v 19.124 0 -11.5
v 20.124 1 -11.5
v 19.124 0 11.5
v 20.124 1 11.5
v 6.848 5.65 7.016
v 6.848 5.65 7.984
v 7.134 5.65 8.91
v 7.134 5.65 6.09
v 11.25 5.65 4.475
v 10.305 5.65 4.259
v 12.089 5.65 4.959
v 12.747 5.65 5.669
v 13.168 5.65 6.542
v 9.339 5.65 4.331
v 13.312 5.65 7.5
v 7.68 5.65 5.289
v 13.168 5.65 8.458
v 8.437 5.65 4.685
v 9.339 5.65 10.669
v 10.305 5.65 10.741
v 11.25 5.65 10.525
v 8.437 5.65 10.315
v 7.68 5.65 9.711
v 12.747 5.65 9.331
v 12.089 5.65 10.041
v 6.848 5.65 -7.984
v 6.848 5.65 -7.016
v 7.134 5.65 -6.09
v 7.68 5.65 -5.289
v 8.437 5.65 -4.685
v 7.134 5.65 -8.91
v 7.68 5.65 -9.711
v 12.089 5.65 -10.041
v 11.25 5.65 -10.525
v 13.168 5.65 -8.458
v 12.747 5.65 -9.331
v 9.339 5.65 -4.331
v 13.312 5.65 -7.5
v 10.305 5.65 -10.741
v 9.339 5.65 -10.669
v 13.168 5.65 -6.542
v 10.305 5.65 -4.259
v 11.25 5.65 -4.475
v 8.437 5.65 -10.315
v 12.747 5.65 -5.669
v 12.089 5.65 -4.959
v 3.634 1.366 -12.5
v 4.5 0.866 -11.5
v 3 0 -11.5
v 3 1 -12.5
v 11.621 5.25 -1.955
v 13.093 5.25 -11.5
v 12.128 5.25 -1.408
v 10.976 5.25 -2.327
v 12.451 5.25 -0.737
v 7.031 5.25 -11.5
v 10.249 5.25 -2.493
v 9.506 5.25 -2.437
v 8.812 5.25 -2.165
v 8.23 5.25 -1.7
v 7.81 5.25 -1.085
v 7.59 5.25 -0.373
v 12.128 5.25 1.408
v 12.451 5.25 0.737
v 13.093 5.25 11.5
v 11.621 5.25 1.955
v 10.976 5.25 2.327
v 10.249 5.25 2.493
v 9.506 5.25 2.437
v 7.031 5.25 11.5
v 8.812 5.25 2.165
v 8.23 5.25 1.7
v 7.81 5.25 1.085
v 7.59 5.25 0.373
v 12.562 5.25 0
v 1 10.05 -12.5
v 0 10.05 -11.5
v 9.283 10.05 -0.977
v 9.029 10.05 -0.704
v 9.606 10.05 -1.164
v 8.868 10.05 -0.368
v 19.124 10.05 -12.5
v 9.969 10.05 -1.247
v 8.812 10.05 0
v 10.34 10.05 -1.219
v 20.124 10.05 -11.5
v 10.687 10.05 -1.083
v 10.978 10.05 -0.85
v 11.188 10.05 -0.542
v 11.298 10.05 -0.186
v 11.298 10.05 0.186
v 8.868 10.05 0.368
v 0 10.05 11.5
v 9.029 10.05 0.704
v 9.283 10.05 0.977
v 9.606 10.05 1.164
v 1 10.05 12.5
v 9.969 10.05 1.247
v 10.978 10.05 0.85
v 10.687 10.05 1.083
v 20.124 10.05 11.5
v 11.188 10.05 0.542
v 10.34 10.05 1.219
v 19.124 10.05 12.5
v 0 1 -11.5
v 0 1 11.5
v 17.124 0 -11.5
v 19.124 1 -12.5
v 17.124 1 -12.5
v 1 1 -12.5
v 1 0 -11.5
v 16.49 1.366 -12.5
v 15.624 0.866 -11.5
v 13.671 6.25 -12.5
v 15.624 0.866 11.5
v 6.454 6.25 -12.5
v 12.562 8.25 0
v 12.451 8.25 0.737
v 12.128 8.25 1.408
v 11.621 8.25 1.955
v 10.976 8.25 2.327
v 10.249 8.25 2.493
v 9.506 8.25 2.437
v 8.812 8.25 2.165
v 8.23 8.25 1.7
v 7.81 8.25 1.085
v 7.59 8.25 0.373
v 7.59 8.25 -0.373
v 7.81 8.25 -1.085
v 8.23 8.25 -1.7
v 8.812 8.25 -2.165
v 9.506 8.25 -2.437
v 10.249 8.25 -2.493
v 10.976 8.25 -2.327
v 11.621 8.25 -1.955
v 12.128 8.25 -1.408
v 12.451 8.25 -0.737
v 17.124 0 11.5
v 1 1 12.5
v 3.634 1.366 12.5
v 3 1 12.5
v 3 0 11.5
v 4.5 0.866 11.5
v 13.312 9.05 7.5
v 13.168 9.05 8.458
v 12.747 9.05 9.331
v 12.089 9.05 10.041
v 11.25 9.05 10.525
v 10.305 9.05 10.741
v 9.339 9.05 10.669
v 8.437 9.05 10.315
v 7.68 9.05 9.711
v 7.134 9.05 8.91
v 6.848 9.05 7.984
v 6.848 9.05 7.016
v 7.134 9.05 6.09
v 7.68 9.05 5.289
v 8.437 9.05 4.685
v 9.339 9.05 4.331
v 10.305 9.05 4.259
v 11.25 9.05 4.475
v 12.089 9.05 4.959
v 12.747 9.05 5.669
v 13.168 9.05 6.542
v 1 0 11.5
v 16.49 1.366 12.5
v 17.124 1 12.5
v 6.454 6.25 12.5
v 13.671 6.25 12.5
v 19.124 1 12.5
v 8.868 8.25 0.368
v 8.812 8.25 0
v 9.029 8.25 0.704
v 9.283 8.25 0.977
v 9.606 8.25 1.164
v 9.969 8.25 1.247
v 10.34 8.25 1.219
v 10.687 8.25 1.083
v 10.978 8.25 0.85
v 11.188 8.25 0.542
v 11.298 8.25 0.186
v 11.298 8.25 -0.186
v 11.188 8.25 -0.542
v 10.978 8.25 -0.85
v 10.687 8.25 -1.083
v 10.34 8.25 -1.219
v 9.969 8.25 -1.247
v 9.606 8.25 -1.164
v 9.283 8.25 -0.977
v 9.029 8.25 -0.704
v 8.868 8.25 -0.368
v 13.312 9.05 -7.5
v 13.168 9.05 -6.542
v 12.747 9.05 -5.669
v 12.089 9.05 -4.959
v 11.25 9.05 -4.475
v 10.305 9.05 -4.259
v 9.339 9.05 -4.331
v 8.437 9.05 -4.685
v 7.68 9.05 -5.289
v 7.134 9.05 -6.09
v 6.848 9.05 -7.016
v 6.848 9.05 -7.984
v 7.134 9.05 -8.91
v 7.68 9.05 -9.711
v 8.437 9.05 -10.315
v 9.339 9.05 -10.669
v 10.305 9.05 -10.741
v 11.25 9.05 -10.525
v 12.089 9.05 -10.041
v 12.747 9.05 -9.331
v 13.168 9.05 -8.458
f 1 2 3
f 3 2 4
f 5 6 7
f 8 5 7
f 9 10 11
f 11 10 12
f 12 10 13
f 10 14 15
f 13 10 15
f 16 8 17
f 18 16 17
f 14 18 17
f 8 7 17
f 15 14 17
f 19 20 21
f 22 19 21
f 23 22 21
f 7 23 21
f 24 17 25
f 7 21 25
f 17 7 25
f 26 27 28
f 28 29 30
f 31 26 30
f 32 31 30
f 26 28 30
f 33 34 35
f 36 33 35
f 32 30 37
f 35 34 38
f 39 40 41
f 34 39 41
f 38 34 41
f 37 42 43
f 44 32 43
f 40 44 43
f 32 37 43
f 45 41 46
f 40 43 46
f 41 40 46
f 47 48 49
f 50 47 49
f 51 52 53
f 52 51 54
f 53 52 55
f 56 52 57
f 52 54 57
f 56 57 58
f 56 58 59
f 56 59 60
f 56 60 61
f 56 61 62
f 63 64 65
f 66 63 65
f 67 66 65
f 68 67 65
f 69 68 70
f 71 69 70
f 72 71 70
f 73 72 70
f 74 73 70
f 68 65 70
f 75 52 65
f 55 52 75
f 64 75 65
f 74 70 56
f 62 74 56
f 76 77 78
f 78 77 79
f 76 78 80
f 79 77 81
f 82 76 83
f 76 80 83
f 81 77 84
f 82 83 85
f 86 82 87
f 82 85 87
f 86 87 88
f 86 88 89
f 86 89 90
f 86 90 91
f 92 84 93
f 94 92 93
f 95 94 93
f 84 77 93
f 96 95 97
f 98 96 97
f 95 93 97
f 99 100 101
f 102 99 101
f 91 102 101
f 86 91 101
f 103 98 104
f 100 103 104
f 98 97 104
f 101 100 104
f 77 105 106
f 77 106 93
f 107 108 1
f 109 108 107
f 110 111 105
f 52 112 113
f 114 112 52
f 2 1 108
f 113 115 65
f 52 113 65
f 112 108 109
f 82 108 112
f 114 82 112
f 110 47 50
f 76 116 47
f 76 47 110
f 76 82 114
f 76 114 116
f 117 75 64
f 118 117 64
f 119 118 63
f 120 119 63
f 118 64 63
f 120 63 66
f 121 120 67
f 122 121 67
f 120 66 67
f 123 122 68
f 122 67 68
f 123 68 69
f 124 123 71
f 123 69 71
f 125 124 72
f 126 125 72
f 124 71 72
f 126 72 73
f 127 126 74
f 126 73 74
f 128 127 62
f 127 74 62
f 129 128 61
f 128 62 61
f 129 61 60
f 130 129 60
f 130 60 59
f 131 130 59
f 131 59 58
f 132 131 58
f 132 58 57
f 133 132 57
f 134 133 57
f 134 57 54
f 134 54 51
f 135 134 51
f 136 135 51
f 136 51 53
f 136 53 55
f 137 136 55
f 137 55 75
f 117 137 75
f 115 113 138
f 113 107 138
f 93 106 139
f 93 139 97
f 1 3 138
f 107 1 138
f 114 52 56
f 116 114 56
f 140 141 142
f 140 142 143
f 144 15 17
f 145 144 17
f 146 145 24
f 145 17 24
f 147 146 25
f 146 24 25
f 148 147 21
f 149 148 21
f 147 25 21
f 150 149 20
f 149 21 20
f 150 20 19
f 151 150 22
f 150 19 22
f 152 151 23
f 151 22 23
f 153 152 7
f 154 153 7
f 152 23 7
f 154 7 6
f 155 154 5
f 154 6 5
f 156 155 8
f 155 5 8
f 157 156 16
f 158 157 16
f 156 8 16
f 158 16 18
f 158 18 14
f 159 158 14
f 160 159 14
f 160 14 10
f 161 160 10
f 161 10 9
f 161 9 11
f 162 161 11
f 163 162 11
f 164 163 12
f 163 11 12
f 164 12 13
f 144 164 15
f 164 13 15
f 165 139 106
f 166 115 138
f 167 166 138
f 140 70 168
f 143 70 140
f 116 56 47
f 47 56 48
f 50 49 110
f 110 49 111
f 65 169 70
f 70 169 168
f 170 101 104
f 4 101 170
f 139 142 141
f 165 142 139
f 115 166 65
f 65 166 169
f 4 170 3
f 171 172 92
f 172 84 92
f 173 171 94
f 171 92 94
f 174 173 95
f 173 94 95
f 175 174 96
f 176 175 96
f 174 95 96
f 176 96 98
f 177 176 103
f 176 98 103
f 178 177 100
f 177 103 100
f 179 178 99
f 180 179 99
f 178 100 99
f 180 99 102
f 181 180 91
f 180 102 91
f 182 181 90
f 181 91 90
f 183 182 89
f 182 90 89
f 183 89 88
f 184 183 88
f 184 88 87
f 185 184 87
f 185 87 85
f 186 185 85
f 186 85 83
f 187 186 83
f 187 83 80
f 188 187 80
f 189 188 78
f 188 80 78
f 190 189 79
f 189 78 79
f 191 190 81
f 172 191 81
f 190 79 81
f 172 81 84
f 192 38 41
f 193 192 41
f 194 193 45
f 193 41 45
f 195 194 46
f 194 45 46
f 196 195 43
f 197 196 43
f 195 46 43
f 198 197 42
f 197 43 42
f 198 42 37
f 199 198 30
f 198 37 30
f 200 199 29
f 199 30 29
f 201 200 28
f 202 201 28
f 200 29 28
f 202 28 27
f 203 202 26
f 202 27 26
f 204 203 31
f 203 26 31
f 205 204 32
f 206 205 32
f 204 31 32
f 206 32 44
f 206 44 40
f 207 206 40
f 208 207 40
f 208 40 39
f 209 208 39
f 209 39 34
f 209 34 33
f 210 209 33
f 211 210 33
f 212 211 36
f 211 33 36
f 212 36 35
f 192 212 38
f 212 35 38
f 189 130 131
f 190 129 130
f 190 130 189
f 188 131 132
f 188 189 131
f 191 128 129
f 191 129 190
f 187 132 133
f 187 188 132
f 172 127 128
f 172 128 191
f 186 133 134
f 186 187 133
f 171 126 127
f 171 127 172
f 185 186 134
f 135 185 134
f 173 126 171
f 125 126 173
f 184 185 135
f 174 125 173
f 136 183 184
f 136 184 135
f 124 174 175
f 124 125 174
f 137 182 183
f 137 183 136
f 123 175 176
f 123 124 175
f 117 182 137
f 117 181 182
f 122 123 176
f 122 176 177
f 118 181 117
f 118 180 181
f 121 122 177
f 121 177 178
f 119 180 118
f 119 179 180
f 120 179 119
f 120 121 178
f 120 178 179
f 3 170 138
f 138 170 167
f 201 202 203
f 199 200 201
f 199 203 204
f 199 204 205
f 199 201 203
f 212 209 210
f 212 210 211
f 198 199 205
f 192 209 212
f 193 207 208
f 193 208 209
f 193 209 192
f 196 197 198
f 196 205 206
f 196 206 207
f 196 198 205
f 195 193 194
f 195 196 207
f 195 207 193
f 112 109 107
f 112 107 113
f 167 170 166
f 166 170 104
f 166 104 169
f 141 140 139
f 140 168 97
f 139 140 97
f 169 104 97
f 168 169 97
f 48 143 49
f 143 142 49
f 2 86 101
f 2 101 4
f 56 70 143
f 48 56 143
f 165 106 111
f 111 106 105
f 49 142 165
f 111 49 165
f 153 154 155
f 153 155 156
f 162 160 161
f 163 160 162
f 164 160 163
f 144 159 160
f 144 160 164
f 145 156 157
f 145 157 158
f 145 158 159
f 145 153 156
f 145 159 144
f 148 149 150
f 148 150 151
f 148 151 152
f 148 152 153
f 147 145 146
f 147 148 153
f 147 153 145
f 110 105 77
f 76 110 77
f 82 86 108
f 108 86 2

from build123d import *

# Parameters (mm, degrees)
PAD_DEPTH        = 12.5
HOLE_D           = 2.5
HOLE_DEPTH       = 25
HOLE_CBORE_D     = 5
HOLE_CBORE_DEPTH = 3
SKETCH002_R      = 3.25
HOLE001_DEPTH    = 3.4
CHAMFER_SIZE     = 1


with BuildPart() as part:
    # Sketch → Pad (new body, symmetric)
    with BuildSketch(Plane.XY):
        Polygon((16.124356, 0), (13.093267, 5.25), (7.031089, 5.25), (4, 0), (0, 0), (0, 10.05), (20.124356, 10.05), (20.124356, 0), align=None)
    extrude(amount=PAD_DEPTH, both=True)

    # Hole
    with Locations(Plane.XZ.offset(-5.25)):
        with Locations((10.062178, 0)):
            CounterBoreHole(HOLE_D / 2, HOLE_CBORE_D / 2, HOLE_CBORE_DEPTH, depth=HOLE_DEPTH)

    # Sketch002 (on Face3 of Hole) → Hole001 (cut)
    with BuildSketch(Plane.XZ.offset(-5.65)):
        with Locations((10.062178, 7.5)):
            Circle(SKETCH002_R)
        with Locations((10.062178, -7.5)):
            Circle(SKETCH002_R)
    extrude(amount=-HOLE001_DEPTH, mode=Mode.SUBTRACT)

    # Chamfer
    chamfer_edges = [part.edges().sort_by_distance(p)[0] for p in [
        (2, 0, 12.5),
        (5.515544, 2.625, 12.5),
        (10.062178, 5.25, 12.5),
        (14.608811, 2.625, 12.5),
        (18.124356, 0, 12.5),
        (20.124356, 5.025, 12.5),
        (0, 5.025, 12.5),
        (4, 0, 0),
        (0, 0, 0),
        (20.124356, 0, 0),
        (16.124356, 0, 0),
        (18.124356, 0, -12.5),
        (20.124356, 5.025, -12.5),
        (14.608811, 2.625, -12.5),
        (10.062178, 5.25, -12.5),
        (5.515544, 2.625, -12.5),
        (2, 0, -12.5),
        (0, 5.025, -12.5),
    ]]
    chamfer(chamfer_edges, length=CHAMFER_SIZE)


solid = part.part
